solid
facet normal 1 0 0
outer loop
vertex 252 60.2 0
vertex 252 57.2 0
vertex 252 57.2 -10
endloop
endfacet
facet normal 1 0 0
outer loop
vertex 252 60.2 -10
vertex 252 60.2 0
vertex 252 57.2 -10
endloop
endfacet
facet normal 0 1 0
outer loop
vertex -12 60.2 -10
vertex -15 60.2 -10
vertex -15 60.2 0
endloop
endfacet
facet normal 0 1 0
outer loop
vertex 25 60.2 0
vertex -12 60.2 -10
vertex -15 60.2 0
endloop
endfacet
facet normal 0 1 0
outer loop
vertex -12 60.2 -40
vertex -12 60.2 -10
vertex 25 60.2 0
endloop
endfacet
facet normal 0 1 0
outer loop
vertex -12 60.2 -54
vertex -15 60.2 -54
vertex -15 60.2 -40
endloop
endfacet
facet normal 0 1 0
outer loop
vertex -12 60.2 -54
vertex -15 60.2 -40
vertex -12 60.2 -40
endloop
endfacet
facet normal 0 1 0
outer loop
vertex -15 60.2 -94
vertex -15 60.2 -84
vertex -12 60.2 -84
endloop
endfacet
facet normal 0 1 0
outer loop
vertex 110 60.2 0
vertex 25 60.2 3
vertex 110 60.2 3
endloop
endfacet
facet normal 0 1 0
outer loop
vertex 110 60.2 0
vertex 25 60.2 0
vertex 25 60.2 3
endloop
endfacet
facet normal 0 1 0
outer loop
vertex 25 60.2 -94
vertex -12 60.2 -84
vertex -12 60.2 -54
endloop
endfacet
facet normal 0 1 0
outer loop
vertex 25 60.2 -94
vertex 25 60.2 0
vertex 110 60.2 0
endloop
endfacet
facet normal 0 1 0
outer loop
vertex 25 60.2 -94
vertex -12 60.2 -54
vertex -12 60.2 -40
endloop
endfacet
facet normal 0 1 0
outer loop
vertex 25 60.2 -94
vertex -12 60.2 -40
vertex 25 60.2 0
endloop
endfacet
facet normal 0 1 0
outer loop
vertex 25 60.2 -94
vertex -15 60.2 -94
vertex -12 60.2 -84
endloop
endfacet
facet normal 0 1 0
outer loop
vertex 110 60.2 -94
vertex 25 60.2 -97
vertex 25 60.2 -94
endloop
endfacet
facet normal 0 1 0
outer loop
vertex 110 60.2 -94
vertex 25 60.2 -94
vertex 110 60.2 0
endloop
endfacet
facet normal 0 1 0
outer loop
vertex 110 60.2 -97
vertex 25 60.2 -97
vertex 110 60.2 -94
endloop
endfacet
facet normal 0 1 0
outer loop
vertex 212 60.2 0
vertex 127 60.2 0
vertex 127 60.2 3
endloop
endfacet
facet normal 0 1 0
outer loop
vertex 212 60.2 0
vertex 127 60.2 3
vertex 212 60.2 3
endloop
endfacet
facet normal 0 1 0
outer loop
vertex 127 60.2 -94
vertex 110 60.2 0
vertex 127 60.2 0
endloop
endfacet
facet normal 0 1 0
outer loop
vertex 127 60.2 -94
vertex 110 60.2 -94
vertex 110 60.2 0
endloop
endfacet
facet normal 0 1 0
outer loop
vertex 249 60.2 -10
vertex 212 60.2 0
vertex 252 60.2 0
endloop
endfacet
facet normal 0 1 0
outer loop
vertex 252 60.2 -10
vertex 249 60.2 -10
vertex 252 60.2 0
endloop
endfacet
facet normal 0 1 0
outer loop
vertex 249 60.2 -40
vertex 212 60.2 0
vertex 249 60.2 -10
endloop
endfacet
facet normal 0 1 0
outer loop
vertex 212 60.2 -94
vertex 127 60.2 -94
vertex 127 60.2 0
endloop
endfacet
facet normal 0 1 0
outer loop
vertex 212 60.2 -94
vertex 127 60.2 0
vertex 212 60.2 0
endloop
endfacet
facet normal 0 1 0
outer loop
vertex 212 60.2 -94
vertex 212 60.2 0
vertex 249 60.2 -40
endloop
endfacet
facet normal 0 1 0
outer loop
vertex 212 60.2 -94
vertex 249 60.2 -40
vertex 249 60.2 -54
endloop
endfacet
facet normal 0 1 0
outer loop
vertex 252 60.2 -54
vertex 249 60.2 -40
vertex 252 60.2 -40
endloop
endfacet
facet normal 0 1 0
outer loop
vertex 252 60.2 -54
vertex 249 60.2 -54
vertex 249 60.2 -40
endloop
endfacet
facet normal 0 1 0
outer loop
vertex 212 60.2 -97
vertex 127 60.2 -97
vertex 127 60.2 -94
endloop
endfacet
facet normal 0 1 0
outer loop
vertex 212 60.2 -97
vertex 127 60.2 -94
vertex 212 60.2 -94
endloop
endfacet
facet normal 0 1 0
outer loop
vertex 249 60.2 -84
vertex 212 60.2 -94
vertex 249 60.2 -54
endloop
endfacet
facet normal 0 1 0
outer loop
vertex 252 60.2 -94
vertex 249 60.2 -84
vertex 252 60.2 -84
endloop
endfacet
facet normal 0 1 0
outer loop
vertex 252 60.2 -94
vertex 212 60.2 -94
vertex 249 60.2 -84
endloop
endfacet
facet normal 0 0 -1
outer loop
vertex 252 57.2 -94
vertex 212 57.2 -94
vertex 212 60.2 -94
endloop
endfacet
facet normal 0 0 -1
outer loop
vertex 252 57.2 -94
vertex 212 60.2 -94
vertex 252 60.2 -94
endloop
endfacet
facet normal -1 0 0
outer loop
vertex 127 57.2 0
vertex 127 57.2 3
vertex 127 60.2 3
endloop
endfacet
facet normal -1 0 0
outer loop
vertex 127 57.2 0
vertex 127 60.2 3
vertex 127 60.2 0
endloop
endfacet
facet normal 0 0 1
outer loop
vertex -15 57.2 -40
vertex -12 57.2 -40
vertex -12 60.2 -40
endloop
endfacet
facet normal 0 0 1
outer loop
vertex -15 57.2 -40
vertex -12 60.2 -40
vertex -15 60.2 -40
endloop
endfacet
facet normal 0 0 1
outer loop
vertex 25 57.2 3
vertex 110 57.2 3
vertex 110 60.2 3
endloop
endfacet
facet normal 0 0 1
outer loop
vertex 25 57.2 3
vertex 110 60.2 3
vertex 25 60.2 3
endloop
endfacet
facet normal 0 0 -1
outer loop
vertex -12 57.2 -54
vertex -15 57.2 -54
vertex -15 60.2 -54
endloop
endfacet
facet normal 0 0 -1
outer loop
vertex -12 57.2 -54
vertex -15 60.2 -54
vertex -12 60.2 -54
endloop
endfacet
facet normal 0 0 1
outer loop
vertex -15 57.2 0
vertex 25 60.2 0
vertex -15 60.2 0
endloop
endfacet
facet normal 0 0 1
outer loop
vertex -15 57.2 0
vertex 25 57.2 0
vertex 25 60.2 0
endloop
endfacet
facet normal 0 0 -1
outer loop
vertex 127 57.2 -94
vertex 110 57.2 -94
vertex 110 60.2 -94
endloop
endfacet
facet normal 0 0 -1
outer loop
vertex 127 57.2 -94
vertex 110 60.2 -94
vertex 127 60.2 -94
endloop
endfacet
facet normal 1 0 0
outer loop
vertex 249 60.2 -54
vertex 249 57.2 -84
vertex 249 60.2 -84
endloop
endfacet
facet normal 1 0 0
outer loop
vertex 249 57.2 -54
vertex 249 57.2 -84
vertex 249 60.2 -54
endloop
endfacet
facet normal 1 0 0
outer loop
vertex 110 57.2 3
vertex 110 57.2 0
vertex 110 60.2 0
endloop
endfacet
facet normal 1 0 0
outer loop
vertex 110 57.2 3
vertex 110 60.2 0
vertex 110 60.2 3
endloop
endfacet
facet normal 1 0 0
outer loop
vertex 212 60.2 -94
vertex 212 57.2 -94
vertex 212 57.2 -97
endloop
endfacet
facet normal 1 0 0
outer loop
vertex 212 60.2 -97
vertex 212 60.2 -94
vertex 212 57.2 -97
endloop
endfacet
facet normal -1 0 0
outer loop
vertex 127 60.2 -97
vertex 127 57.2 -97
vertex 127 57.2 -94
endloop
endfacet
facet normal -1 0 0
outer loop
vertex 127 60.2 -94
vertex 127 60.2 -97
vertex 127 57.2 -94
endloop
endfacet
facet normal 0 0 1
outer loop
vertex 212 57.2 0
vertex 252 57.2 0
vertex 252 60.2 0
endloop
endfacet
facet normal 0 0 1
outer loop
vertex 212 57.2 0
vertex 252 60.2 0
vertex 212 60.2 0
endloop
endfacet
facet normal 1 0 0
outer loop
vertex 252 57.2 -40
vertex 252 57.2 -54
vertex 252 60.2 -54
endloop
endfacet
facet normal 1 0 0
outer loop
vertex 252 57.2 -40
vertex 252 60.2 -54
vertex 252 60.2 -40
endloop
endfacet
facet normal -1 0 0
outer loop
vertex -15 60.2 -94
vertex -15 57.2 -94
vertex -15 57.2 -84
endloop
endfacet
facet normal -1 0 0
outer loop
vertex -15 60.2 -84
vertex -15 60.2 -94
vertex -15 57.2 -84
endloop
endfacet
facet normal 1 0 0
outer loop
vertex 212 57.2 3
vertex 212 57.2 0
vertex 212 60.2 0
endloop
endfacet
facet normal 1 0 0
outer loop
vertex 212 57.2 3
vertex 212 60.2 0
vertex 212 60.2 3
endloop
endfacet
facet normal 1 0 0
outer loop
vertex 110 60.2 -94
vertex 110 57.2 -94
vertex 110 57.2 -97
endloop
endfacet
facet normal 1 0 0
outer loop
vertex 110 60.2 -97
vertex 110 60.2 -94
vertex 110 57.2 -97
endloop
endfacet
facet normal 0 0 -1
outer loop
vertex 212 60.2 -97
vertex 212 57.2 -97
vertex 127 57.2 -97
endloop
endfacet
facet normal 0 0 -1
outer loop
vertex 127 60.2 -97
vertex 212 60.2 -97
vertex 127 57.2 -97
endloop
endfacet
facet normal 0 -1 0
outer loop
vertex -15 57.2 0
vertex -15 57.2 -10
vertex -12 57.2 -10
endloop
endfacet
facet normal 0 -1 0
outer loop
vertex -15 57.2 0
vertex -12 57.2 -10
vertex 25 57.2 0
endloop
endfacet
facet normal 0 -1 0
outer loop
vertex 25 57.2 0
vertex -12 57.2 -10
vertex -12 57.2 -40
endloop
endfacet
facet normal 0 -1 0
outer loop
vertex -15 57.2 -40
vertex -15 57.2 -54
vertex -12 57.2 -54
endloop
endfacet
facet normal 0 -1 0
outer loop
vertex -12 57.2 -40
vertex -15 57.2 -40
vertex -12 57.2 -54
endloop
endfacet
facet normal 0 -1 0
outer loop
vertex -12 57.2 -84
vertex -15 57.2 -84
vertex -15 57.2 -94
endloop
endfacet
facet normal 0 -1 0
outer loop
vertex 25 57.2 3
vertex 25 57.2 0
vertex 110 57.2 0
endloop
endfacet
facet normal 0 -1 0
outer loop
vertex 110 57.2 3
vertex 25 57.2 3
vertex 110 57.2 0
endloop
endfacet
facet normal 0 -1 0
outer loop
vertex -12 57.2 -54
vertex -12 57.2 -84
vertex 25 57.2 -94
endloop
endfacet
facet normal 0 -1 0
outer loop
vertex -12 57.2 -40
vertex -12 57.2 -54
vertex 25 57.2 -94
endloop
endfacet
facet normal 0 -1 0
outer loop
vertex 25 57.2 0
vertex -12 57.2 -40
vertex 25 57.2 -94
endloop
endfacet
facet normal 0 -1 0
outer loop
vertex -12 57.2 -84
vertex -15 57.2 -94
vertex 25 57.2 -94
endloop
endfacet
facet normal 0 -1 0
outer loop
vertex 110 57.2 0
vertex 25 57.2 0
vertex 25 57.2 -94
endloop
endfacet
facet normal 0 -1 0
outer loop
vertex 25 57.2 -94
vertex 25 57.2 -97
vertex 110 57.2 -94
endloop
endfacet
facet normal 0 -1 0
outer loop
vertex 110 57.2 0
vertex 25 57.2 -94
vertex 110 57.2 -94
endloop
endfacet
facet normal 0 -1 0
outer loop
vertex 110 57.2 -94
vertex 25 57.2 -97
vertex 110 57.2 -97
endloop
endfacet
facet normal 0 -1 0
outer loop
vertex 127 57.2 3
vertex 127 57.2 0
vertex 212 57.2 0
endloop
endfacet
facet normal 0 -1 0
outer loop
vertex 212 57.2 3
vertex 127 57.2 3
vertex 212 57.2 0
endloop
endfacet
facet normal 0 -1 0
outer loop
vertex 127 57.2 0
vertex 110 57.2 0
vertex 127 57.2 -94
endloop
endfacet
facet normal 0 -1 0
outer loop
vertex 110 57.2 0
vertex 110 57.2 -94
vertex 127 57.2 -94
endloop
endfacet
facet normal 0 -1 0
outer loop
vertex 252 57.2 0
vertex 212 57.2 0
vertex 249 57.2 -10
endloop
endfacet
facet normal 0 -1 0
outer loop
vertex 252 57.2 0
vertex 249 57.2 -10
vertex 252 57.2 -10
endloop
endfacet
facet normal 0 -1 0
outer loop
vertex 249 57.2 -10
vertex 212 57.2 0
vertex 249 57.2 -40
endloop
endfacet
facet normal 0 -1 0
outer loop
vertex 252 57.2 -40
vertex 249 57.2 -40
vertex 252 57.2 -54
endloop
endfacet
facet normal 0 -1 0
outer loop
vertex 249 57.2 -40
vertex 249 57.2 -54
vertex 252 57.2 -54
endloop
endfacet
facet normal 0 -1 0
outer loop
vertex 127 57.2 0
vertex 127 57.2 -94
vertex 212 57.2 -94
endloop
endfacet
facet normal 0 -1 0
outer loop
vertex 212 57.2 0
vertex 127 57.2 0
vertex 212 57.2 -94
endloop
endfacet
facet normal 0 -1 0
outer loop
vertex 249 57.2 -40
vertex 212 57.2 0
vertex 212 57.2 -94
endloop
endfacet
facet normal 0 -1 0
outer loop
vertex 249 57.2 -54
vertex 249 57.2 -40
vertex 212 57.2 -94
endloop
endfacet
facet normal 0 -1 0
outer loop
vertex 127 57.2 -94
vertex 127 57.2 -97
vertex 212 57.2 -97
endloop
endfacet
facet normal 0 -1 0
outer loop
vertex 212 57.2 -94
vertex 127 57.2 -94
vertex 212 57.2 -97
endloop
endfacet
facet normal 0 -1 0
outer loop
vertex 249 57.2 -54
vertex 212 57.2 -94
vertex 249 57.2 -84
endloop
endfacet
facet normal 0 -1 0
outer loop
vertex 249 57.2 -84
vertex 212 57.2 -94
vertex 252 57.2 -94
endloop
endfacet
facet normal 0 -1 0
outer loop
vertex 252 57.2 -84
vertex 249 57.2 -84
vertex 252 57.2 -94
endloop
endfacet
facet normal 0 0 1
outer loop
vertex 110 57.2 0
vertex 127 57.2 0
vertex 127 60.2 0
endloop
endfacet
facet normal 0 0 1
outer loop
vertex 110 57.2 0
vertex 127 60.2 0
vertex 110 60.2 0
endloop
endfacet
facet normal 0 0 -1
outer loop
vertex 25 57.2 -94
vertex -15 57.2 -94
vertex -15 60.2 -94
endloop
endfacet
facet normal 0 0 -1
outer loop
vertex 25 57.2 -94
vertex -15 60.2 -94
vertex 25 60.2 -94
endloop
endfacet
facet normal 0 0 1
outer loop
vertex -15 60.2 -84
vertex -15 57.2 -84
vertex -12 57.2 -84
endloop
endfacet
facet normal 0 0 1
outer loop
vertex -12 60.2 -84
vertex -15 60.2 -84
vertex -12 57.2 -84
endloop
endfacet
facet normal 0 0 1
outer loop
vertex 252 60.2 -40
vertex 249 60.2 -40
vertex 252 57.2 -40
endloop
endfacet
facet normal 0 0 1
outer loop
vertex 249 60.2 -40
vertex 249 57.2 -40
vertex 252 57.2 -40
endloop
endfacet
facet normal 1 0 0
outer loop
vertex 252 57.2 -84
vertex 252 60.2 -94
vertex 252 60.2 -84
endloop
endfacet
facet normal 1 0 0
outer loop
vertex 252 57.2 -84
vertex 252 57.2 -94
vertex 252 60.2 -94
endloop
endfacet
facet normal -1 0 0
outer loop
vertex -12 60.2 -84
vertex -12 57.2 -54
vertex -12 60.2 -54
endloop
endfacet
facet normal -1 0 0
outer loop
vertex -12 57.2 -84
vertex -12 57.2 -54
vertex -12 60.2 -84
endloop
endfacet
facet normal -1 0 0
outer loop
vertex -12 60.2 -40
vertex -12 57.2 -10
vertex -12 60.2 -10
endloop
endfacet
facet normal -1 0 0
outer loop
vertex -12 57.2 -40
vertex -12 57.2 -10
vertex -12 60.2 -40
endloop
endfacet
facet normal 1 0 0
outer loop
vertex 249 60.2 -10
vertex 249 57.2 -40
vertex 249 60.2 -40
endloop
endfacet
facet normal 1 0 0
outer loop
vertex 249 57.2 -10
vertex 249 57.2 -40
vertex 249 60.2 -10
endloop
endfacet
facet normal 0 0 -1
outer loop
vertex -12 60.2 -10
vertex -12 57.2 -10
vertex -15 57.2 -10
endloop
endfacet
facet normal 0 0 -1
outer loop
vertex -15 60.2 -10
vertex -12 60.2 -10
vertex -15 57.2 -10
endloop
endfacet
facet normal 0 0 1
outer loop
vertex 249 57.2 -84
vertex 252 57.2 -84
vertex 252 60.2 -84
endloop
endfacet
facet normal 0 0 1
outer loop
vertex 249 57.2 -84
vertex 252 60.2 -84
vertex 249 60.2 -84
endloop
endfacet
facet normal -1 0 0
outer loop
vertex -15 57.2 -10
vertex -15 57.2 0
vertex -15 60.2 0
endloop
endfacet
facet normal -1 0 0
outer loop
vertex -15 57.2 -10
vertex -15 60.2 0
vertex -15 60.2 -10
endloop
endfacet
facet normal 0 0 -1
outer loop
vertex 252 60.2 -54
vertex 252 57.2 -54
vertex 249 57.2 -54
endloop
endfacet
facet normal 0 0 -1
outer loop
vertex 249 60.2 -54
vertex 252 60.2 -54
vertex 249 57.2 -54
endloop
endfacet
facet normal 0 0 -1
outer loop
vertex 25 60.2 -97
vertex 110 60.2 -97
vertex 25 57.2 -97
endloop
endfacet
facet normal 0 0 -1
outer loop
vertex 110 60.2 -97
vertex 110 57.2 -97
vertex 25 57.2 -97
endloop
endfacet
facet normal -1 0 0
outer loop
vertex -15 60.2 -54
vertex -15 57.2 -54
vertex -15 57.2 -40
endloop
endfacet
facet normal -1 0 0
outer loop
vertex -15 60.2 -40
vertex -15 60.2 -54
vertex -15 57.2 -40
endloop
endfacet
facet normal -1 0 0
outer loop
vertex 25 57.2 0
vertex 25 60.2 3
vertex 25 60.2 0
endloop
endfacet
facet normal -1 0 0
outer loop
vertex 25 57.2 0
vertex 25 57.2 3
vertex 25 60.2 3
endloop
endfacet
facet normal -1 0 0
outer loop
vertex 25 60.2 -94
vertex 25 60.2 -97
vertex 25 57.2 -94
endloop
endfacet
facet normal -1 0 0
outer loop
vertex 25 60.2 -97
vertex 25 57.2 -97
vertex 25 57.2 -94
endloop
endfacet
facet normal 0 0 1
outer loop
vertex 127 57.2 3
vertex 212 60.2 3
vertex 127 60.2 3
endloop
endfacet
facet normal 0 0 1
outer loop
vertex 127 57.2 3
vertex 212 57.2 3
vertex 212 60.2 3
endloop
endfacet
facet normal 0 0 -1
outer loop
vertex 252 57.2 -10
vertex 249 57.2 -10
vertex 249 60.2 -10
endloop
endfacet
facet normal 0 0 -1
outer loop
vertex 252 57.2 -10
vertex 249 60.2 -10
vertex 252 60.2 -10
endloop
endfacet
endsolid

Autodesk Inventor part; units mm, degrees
ref_plane "YZ Plane" through (0, 0, 0) normal (1, 0, 0) x (0, 1, 0)
ref_plane "XZ Plane" through (0, 0, 0) normal (0, 1, 0) x (-1, 0, 0)
ref_plane "Work Plane1" through (127, 57.2, 0) normal (0, 1, 0) x (1, 0, 0)
sketch "Sketch3" plane through (127, 57.2, 0) normal (0, 1, 0) x (1, 0, 0)
  line L0 (0, 0) -> (85, 0) construction
  line L1 (0, 0) -> (0, -3) construction
  line L2 (85, -3) -> (0, -3) construction
  line L3 (85, 0) -> (85, -3) construction
  line L4 (-102, 0) -> (-17, 0) construction
  line L5 (-102, 0) -> (-102, -3) construction
  line L6 (-17, -3) -> (-102, -3) construction
  line L7 (-17, 0) -> (-17, -3) construction
  line L8 (122, 10) -> (125, 10) construction
  line L9 (122, 10) -> (122, 0) construction
  line L10 (125, 0) -> (122, 0) construction
  line L11 (125, 10) -> (125, 0) construction
  line L12 (122, 40) -> (125, 40) construction
  line L13 (125, 54) -> (125, 40) construction
  line L14 (122, 54) -> (125, 54) construction
  line L15 (122, 54) -> (122, 40) construction
  line L16 (122, 84) -> (125, 84) construction
  line L17 (125, 94) -> (125, 84) construction
  line L18 (122, 94) -> (125, 94) construction
  line L19 (122, 94) -> (122, 84) construction
  line L20 (122, 0) -> (-139, 0)
  line L21 (-139, 0) -> (-139, 94)
  line L22 (-139, 94) -> (122, 94)
  line L23 (122, 94) -> (122, 0)
  line L24 (-102, 0) -> (-142, 0) projected
  line L25 (-17, -3) -> (-102, -3)
  line L26 (-102, -3) -> (-102, 0)
  line L27 (-102, 0) -> (-17, 0)
  line L28 (-17, 0) -> (-17, -3)
  line L29 (85, -3) -> (0, -3)
  line L30 (0, -3) -> (0, 0)
  line L31 (0, 0) -> (85, 0)
  line L32 (85, 0) -> (85, -3)
  line L33 (122, 10) -> (125, 10) projected
  line L34 (122, 0) -> (125, 0)
  line L35 (125, 0) -> (125, 10)
  line L36 (125, 10) -> (122, 10)
  line L37 (122, 10) -> (122, 0)
  line L38 (125, 54) -> (125, 40) projected
  line L39 (122, 40) -> (125, 40)
  line L40 (125, 40) -> (125, 54)
  line L41 (125, 54) -> (122, 54)
  line L42 (122, 54) -> (122, 40)
  line L43 (122, 94) -> (125, 94)
  line L44 (125, 94) -> (125, 84)
  line L45 (125, 84) -> (122, 84)
  line L46 (122, 84) -> (122, 94)
  line L47 (-139, 47) -> (122, 47) construction
  line L48 (-8.5, 94) -> (-8.5, 0) construction
  line L49 (-139, 10) -> (-142, 10) construction
  line L50 (-139, 10) -> (-139, 0) construction
  line L51 (-142, 0) -> (-139, 0) construction
  line L52 (-142, 10) -> (-142, 0) construction
  line L53 (-139, 40) -> (-142, 40) construction
  line L54 (-142, 54) -> (-142, 40) construction
  line L55 (-139, 54) -> (-142, 54) construction
  line L56 (-139, 54) -> (-139, 40) construction
  line L57 (-139, 84) -> (-142, 84) construction
  line L58 (-142, 94) -> (-142, 84) construction
  line L59 (-139, 94) -> (-142, 94) construction
  line L60 (-139, 94) -> (-139, 84) construction
  line L61 (-139, 94) -> (-139, 0)
  line L62 (-139, 10) -> (-142, 10)
  line L63 (-139, 0) -> (-142, 0)
  line L64 (-142, 0) -> (-142, 10)
  line L65 (-142, 10) -> (-139, 10)
  line L66 (-139, 10) -> (-139, 0)
  line L67 (-142, 54) -> (-142, 40)
  line L68 (-139, 40) -> (-142, 40)
  line L69 (-142, 40) -> (-142, 54)
  line L70 (-142, 54) -> (-139, 54)
  line L71 (-139, 54) -> (-139, 40)
  line L72 (-139, 94) -> (-142, 94)
  line L73 (-142, 94) -> (-142, 84)
  line L74 (-142, 84) -> (-139, 84)
  line L75 (-139, 84) -> (-139, 94)
  line L76 (0, 94) -> (85, 94) construction
  line L77 (0, 94) -> (0, 97) construction
  line L78 (85, 97) -> (0, 97) construction
  line L79 (85, 94) -> (85, 97) construction
  line L80 (-102, 94) -> (-17, 94) construction
  line L81 (-102, 94) -> (-102, 97) construction
  line L82 (-17, 97) -> (-102, 97) construction
  line L83 (-17, 94) -> (-17, 97) construction
  line L84 (-17, 97) -> (-102, 97)
  line L85 (-102, 97) -> (-102, 94)
  line L86 (-102, 94) -> (-17, 94)
  line L87 (-17, 94) -> (-17, 97)
  line L88 (85, 97) -> (0, 97)
  line L89 (0, 97) -> (0, 94)
  line L90 (0, 94) -> (85, 94)
  line L91 (85, 94) -> (85, 97)
  point P0 (-127, 0)
  dimension "d55" = 261
  dimension "d56" = 94
extrude "Extrusion4" add sketch "Sketch3" along normal blind 3
properties part number "case_roof"
